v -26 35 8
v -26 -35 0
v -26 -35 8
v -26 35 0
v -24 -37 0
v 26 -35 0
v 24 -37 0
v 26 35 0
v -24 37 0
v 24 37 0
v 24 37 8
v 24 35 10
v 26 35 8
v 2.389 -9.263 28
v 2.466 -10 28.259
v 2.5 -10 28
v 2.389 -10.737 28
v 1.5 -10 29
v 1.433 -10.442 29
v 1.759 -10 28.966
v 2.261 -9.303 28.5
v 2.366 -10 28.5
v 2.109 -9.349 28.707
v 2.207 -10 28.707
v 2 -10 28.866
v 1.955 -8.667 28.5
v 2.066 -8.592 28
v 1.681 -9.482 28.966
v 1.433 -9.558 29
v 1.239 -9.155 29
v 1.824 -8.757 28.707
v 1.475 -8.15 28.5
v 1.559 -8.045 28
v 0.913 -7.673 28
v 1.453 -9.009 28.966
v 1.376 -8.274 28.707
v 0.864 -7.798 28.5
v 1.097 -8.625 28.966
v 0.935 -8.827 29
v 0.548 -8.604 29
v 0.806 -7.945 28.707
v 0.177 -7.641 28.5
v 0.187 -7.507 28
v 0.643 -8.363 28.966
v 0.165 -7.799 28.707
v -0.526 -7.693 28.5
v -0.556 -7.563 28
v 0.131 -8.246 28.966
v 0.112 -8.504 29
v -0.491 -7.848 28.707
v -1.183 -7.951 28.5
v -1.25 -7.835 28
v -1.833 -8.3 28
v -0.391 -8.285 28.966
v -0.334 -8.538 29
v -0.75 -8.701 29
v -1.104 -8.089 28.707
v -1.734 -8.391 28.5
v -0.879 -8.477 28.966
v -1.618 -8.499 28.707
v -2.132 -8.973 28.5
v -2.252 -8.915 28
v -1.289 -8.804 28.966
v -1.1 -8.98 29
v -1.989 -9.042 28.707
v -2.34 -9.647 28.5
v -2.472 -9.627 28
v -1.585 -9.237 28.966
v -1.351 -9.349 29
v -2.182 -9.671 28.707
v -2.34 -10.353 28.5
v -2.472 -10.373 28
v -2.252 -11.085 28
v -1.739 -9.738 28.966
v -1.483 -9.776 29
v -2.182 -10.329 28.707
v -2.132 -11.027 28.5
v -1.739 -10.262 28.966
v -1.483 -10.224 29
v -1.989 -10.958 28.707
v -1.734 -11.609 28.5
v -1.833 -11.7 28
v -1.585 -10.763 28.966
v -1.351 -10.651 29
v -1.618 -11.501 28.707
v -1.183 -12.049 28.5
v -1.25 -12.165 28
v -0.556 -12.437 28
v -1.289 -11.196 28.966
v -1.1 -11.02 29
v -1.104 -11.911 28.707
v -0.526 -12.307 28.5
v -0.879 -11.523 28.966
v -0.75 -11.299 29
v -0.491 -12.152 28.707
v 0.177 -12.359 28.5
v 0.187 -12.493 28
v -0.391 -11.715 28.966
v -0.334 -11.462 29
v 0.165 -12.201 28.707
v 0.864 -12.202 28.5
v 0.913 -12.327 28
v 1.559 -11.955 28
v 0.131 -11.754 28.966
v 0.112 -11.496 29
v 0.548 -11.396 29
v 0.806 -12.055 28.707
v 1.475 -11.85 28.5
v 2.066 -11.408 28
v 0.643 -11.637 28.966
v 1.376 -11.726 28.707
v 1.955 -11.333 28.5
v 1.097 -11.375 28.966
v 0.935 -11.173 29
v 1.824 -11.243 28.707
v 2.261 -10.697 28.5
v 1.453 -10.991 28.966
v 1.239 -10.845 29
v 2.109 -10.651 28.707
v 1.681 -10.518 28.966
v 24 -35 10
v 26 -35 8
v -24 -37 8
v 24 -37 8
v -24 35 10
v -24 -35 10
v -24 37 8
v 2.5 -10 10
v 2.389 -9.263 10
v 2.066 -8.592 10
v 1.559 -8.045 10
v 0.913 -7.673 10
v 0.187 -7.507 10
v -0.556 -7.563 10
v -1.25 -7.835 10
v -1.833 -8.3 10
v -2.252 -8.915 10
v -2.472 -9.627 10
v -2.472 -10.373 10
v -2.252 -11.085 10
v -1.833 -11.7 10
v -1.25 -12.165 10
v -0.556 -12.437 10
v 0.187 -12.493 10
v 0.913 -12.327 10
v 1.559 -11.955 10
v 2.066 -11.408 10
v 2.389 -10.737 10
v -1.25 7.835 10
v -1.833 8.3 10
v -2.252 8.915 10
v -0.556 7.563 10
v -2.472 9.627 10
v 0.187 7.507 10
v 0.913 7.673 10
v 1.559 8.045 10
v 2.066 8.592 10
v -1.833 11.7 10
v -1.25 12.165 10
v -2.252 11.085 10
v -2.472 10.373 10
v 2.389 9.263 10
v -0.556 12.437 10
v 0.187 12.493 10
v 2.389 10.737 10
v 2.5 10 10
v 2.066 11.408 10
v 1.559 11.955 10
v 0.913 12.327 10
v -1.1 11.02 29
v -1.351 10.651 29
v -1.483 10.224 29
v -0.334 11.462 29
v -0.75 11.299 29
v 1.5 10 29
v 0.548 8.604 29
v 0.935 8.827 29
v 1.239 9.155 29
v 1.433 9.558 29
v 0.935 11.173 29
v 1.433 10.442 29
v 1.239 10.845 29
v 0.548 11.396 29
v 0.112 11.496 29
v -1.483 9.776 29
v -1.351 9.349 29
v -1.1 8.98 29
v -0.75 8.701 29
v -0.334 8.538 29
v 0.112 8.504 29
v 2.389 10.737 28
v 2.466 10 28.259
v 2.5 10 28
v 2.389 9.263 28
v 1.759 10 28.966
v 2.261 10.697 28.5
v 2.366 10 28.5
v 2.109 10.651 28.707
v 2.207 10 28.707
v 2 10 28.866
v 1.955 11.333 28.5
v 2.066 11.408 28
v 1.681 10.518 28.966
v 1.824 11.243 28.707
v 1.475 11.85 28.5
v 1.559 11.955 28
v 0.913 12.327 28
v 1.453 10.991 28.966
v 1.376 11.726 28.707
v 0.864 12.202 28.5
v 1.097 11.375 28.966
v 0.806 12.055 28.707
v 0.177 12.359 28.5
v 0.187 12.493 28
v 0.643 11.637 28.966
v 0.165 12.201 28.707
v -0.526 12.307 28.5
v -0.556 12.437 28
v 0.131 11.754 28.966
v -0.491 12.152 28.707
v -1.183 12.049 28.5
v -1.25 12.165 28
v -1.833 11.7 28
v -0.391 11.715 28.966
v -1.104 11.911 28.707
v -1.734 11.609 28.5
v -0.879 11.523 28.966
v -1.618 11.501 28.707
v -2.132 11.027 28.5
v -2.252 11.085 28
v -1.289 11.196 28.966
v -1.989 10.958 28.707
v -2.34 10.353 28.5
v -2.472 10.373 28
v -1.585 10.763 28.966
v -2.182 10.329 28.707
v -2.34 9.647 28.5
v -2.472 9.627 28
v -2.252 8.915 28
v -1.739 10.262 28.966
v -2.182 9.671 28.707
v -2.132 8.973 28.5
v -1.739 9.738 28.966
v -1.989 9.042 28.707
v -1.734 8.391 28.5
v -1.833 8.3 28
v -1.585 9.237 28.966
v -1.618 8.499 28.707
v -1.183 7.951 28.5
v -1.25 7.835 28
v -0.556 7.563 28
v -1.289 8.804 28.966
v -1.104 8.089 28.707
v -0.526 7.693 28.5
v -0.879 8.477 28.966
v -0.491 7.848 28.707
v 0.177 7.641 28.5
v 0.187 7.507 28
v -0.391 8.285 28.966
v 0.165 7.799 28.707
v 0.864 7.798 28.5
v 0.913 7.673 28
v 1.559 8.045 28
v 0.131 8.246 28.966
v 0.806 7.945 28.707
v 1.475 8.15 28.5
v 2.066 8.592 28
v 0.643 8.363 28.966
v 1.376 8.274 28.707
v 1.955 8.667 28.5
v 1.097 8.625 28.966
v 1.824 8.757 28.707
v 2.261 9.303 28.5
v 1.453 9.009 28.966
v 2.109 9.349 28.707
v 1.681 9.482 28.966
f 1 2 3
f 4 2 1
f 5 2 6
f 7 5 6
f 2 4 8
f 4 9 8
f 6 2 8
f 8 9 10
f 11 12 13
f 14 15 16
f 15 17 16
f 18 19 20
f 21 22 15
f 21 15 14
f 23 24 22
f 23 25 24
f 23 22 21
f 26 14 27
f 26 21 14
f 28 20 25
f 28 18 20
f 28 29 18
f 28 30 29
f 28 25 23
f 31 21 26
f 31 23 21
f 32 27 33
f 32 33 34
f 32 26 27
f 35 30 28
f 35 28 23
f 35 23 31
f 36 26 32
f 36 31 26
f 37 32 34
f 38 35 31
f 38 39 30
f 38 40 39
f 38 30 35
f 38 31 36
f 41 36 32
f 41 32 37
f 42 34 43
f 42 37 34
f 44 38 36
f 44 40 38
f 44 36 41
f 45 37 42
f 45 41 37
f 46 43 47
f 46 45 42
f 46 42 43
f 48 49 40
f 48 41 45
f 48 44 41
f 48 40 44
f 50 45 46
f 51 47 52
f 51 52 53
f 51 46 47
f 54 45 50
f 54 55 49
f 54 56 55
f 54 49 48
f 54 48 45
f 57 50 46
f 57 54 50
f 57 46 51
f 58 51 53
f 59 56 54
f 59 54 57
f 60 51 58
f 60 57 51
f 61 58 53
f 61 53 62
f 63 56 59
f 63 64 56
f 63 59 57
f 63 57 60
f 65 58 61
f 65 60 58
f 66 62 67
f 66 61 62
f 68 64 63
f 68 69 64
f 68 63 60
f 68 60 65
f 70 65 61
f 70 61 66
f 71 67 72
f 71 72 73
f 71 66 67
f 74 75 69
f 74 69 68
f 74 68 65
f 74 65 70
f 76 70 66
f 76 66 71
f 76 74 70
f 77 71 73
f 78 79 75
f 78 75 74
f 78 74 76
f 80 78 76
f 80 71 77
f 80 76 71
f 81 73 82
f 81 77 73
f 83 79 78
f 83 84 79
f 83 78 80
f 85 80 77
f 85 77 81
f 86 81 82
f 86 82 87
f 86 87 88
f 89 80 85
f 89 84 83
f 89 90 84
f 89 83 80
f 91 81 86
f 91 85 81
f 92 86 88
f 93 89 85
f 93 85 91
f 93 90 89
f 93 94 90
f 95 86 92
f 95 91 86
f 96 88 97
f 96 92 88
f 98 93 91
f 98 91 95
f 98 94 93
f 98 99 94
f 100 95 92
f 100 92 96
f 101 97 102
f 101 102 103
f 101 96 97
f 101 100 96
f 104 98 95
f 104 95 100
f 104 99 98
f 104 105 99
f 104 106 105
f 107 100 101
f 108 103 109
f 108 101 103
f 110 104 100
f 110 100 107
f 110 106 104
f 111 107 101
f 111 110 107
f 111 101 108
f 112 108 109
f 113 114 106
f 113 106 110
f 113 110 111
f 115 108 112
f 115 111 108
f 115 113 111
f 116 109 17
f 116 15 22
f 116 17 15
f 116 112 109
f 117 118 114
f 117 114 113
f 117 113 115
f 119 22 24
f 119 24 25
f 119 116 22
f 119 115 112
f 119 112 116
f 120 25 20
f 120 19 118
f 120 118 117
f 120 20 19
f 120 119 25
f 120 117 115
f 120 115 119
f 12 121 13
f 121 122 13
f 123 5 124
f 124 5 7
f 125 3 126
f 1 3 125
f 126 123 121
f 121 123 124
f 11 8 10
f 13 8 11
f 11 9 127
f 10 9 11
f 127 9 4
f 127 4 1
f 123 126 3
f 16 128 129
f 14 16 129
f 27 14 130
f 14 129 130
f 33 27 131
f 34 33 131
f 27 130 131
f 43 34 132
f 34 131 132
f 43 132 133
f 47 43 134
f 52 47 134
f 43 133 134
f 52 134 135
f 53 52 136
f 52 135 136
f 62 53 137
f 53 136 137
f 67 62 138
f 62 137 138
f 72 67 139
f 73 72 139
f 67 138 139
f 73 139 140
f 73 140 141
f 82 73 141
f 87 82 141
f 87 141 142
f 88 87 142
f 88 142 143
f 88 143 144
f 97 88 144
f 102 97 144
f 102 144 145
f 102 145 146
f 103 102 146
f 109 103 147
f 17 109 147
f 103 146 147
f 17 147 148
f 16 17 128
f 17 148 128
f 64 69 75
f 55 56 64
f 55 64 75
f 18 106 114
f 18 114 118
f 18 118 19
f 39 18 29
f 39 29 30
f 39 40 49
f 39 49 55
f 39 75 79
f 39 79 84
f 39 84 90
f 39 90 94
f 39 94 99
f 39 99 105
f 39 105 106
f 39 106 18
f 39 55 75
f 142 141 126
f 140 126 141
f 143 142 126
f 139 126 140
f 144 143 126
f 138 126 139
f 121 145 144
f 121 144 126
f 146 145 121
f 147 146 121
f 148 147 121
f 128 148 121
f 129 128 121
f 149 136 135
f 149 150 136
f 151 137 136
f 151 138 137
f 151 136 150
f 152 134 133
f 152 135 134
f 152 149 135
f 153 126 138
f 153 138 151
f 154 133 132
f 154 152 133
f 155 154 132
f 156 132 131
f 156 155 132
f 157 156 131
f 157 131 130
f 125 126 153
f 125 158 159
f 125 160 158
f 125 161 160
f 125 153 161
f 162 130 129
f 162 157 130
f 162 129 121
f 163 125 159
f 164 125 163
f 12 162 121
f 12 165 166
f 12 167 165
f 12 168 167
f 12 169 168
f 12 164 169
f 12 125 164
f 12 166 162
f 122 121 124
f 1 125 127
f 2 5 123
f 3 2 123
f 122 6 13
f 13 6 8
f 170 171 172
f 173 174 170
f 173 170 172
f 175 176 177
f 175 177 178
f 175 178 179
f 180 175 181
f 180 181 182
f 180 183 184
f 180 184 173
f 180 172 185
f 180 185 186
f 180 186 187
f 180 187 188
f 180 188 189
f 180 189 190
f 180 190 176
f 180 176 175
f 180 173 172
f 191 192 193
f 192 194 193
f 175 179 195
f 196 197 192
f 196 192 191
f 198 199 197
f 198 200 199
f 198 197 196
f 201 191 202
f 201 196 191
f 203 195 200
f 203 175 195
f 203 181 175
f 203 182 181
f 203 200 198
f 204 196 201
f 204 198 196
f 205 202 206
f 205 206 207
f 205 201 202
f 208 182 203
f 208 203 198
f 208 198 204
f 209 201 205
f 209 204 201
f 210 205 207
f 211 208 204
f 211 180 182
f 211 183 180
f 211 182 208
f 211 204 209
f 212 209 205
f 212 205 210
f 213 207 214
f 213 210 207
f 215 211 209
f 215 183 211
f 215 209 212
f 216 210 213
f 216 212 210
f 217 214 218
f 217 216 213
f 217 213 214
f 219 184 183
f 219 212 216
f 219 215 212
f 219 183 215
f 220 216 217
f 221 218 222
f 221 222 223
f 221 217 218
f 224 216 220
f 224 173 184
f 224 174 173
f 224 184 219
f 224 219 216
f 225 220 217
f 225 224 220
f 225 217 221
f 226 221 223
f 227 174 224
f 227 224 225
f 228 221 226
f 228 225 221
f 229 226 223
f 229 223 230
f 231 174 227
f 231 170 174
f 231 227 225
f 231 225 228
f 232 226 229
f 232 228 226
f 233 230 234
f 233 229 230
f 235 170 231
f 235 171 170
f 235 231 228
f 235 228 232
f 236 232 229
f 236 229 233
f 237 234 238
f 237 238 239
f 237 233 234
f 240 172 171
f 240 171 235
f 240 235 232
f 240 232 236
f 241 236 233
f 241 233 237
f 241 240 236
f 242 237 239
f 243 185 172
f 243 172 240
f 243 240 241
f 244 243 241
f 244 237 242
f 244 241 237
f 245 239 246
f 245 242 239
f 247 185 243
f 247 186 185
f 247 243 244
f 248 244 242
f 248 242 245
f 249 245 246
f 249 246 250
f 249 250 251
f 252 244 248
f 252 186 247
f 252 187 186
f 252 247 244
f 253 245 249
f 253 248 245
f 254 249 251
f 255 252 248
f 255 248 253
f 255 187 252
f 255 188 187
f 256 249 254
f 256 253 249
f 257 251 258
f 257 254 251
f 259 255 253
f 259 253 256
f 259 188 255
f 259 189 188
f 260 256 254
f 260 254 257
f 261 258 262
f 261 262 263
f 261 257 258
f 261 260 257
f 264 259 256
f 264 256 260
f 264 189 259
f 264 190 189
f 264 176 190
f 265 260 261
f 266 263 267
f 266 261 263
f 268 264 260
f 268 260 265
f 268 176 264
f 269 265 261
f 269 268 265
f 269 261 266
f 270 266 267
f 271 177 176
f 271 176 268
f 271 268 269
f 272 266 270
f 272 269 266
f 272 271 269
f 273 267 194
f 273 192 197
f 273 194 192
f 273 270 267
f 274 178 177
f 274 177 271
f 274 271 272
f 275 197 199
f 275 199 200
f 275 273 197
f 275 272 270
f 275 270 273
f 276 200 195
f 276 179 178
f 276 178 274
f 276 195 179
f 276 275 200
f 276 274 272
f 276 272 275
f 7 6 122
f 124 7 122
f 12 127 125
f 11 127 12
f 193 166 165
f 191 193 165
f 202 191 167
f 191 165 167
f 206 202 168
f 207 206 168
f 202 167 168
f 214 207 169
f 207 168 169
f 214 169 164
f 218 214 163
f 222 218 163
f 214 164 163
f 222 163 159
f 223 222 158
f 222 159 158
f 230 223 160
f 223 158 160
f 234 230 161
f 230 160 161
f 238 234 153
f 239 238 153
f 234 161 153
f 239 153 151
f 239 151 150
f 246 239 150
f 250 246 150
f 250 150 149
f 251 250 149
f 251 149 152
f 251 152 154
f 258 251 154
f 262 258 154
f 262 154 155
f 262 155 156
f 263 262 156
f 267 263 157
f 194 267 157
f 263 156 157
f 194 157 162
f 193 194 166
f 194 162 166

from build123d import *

# Parameters (mm, degrees)
F0_W     = 52
F0_H     = 74
F1_DEPTH = 10
F2_R     = 2.5
F3_DEPTH = 19
F4_R     = 1
F5_SIZE  = 2


with BuildPart() as f1:
    # F0 (on Top) → F1 (new body)
    with BuildSketch(Plane.XY):
        Rectangle(F0_W, F0_H)
    extrude(amount=F1_DEPTH)

    # F2 (on face) → F3 (join)
    with BuildSketch(Plane.XY.offset(10)):
        with Locations((0, 10)):
            Circle(F2_R)
        with Locations((0, -10)):
            Circle(F2_R)
    extrude(amount=F3_DEPTH)

    # F4
    f4_edges = [f1.edges().sort_by_distance(p)[0] for p in [
        (-2.5, 10, 29),
        (-2.5, -10, 29),
    ]]
    fillet(f4_edges, radius=F4_R)

    # F5
    f5_edges = [f1.edges().sort_by_distance(p)[0] for p in [
        (0, 37, 10),
        (26, 0, 10),
        (-26, 0, 10),
        (0, -37, 10),
        (-26, -37, 5),
        (26, -37, 5),
        (-26, 37, 5),
        (26, 37, 5),
    ]]
    chamfer(f5_edges, length=F5_SIZE)


solid = f1.part
